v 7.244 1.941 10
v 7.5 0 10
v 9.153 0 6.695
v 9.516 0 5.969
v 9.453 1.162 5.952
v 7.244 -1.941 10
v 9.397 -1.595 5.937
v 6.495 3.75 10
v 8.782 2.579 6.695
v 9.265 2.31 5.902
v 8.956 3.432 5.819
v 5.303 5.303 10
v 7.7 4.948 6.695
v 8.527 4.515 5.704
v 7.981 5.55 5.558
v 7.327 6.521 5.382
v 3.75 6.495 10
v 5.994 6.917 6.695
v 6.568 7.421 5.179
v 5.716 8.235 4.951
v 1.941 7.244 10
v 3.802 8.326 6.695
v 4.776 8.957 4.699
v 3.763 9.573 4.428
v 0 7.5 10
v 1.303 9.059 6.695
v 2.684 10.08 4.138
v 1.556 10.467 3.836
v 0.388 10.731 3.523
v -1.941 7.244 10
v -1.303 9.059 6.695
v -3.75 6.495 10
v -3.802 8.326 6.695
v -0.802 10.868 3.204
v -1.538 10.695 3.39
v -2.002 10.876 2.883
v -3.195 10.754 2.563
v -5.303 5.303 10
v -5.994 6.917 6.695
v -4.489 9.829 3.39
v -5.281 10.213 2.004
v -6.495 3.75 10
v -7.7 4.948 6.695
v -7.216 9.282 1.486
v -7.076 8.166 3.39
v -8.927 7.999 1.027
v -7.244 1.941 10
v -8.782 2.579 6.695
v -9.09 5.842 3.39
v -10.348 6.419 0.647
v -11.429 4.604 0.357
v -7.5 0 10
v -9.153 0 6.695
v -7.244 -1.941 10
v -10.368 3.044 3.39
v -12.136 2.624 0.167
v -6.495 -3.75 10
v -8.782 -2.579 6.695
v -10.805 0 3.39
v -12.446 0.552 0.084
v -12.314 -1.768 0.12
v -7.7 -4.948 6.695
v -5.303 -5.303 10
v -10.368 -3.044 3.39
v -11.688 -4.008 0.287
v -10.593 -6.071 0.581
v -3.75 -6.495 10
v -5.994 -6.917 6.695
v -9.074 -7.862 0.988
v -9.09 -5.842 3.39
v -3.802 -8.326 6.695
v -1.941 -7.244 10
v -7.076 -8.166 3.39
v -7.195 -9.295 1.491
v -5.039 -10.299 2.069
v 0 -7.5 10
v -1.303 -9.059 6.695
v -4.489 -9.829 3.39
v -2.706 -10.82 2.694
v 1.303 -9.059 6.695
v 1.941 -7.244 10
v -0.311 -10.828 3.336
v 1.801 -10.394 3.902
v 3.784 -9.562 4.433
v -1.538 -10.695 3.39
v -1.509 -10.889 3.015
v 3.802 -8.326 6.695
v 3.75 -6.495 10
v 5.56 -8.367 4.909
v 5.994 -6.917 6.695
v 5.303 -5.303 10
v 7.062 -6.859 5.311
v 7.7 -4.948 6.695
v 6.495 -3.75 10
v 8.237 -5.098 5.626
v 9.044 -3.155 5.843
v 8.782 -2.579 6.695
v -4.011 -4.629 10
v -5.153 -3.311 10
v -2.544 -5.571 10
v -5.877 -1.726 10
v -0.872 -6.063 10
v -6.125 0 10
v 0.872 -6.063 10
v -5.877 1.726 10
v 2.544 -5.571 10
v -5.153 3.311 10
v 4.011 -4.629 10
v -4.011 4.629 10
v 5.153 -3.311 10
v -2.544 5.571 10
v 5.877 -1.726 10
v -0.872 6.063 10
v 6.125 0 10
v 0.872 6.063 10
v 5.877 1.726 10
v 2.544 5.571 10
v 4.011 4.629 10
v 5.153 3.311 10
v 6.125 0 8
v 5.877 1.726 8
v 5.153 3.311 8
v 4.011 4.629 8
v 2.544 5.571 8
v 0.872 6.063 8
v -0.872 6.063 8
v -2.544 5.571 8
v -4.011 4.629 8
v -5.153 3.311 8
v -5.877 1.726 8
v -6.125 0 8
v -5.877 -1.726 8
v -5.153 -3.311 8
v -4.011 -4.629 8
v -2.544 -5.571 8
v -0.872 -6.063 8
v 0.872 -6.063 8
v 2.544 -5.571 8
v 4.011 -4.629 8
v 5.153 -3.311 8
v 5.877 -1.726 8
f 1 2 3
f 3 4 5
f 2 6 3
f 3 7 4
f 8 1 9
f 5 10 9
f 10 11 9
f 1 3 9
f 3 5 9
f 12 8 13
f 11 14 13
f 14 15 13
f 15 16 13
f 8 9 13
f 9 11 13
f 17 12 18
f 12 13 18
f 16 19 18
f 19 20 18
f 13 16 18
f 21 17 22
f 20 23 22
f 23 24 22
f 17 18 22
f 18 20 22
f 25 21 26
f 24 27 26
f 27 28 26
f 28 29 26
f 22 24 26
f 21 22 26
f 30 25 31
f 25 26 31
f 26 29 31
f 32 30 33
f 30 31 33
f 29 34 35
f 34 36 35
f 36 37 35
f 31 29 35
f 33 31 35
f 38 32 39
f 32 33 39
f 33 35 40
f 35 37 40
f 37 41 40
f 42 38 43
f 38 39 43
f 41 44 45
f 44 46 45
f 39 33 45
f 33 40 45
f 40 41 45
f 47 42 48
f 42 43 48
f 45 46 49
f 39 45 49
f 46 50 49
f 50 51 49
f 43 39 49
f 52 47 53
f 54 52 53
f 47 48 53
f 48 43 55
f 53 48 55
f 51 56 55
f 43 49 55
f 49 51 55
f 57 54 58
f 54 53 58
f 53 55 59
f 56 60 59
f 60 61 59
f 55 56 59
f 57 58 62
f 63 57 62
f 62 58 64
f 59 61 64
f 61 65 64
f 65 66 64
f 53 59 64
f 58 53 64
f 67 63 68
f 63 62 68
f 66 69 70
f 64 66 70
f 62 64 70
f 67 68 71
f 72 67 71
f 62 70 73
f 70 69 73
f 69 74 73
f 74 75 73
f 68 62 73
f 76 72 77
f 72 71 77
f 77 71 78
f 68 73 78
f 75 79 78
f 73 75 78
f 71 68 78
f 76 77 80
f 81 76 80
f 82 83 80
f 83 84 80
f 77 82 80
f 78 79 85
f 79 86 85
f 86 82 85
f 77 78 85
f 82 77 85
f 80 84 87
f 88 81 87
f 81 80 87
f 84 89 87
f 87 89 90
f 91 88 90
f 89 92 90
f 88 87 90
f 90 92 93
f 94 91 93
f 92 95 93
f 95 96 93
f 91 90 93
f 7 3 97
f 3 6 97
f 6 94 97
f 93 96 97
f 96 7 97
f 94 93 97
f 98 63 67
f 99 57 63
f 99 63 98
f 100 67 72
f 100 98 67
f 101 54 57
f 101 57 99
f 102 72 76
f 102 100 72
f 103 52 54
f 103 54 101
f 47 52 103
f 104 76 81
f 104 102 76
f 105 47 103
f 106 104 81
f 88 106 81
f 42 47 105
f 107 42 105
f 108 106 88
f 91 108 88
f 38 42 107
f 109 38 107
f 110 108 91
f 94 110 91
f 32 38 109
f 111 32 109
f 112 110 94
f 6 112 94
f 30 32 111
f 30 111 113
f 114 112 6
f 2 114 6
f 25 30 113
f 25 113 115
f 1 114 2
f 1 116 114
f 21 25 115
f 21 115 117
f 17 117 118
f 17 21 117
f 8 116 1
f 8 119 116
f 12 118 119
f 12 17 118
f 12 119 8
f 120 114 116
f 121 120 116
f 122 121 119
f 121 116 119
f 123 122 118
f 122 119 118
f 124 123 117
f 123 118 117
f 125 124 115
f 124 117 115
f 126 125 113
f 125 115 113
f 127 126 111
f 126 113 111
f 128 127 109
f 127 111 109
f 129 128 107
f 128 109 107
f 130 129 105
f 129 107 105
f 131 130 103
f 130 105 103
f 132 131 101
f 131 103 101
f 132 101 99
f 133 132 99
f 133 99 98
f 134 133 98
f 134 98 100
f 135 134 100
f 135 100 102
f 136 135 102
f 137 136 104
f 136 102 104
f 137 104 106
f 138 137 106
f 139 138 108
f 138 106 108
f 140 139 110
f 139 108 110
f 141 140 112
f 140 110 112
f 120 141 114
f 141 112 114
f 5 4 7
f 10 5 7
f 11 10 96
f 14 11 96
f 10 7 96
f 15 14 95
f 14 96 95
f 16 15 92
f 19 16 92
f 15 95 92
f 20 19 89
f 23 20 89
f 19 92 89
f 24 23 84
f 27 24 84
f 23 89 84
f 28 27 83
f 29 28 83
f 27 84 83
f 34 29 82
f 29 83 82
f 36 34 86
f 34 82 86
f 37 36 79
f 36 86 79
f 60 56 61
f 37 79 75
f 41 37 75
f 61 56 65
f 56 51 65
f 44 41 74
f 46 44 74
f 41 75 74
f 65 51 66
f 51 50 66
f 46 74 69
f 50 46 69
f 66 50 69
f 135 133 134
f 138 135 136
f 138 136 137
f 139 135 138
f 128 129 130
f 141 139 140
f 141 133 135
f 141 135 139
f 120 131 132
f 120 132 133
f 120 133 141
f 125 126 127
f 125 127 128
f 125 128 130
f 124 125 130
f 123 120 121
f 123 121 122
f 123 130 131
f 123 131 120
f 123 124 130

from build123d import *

# Parameters (mm, degrees)
F0_R     = 12.5
F1_DEPTH = 10
F2_SIZE2 = 9.99999
F2_SIZE  = 4.99999
F4_DEPTH = 12.5
F5_R     = 6.125
F6_DEPTH = 2


# Not quite as in the source:
# - a fillet or chamfer is up to 0.001 mm smaller than in the source, because OpenCascade refuses the exact size


with BuildPart() as f1:
    # F0 (on Top) → F1 (new body)
    with BuildSketch(Plane.XY):
        Circle(F0_R)
    extrude(amount=F1_DEPTH)

    # F2 (size 5 and 10 in the source; OpenCascade refuses exactly that, so slightly less here)
    f2_edges = [f1.edges().sort_by_distance(p)[0] for p in [
        (-12.5, 0, 10),
    ]]
    f2_side = f1.faces().sort_by_distance((0, 0, 10))[0]
    chamfer(f2_edges, length=F2_SIZE, length2=F2_SIZE2, reference=f2_side)

    # F3 (on Front) → F4 (cut, symmetric)
    with BuildSketch(Plane.XZ):
        Polygon((11.7184263772, 6.5591478468), (-12.7606466413, 0), (-7.277042605, -3.8485343102), (16.1768086255, -2.4198731408), align=None)
    extrude(amount=F4_DEPTH, both=True, mode=Mode.SUBTRACT)

    # F5 (on face) → F6 (cut)
    with BuildSketch(Plane.XY.offset(10)):
        Circle(F5_R)
    extrude(amount=-F6_DEPTH, mode=Mode.SUBTRACT)


solid = f1.part
